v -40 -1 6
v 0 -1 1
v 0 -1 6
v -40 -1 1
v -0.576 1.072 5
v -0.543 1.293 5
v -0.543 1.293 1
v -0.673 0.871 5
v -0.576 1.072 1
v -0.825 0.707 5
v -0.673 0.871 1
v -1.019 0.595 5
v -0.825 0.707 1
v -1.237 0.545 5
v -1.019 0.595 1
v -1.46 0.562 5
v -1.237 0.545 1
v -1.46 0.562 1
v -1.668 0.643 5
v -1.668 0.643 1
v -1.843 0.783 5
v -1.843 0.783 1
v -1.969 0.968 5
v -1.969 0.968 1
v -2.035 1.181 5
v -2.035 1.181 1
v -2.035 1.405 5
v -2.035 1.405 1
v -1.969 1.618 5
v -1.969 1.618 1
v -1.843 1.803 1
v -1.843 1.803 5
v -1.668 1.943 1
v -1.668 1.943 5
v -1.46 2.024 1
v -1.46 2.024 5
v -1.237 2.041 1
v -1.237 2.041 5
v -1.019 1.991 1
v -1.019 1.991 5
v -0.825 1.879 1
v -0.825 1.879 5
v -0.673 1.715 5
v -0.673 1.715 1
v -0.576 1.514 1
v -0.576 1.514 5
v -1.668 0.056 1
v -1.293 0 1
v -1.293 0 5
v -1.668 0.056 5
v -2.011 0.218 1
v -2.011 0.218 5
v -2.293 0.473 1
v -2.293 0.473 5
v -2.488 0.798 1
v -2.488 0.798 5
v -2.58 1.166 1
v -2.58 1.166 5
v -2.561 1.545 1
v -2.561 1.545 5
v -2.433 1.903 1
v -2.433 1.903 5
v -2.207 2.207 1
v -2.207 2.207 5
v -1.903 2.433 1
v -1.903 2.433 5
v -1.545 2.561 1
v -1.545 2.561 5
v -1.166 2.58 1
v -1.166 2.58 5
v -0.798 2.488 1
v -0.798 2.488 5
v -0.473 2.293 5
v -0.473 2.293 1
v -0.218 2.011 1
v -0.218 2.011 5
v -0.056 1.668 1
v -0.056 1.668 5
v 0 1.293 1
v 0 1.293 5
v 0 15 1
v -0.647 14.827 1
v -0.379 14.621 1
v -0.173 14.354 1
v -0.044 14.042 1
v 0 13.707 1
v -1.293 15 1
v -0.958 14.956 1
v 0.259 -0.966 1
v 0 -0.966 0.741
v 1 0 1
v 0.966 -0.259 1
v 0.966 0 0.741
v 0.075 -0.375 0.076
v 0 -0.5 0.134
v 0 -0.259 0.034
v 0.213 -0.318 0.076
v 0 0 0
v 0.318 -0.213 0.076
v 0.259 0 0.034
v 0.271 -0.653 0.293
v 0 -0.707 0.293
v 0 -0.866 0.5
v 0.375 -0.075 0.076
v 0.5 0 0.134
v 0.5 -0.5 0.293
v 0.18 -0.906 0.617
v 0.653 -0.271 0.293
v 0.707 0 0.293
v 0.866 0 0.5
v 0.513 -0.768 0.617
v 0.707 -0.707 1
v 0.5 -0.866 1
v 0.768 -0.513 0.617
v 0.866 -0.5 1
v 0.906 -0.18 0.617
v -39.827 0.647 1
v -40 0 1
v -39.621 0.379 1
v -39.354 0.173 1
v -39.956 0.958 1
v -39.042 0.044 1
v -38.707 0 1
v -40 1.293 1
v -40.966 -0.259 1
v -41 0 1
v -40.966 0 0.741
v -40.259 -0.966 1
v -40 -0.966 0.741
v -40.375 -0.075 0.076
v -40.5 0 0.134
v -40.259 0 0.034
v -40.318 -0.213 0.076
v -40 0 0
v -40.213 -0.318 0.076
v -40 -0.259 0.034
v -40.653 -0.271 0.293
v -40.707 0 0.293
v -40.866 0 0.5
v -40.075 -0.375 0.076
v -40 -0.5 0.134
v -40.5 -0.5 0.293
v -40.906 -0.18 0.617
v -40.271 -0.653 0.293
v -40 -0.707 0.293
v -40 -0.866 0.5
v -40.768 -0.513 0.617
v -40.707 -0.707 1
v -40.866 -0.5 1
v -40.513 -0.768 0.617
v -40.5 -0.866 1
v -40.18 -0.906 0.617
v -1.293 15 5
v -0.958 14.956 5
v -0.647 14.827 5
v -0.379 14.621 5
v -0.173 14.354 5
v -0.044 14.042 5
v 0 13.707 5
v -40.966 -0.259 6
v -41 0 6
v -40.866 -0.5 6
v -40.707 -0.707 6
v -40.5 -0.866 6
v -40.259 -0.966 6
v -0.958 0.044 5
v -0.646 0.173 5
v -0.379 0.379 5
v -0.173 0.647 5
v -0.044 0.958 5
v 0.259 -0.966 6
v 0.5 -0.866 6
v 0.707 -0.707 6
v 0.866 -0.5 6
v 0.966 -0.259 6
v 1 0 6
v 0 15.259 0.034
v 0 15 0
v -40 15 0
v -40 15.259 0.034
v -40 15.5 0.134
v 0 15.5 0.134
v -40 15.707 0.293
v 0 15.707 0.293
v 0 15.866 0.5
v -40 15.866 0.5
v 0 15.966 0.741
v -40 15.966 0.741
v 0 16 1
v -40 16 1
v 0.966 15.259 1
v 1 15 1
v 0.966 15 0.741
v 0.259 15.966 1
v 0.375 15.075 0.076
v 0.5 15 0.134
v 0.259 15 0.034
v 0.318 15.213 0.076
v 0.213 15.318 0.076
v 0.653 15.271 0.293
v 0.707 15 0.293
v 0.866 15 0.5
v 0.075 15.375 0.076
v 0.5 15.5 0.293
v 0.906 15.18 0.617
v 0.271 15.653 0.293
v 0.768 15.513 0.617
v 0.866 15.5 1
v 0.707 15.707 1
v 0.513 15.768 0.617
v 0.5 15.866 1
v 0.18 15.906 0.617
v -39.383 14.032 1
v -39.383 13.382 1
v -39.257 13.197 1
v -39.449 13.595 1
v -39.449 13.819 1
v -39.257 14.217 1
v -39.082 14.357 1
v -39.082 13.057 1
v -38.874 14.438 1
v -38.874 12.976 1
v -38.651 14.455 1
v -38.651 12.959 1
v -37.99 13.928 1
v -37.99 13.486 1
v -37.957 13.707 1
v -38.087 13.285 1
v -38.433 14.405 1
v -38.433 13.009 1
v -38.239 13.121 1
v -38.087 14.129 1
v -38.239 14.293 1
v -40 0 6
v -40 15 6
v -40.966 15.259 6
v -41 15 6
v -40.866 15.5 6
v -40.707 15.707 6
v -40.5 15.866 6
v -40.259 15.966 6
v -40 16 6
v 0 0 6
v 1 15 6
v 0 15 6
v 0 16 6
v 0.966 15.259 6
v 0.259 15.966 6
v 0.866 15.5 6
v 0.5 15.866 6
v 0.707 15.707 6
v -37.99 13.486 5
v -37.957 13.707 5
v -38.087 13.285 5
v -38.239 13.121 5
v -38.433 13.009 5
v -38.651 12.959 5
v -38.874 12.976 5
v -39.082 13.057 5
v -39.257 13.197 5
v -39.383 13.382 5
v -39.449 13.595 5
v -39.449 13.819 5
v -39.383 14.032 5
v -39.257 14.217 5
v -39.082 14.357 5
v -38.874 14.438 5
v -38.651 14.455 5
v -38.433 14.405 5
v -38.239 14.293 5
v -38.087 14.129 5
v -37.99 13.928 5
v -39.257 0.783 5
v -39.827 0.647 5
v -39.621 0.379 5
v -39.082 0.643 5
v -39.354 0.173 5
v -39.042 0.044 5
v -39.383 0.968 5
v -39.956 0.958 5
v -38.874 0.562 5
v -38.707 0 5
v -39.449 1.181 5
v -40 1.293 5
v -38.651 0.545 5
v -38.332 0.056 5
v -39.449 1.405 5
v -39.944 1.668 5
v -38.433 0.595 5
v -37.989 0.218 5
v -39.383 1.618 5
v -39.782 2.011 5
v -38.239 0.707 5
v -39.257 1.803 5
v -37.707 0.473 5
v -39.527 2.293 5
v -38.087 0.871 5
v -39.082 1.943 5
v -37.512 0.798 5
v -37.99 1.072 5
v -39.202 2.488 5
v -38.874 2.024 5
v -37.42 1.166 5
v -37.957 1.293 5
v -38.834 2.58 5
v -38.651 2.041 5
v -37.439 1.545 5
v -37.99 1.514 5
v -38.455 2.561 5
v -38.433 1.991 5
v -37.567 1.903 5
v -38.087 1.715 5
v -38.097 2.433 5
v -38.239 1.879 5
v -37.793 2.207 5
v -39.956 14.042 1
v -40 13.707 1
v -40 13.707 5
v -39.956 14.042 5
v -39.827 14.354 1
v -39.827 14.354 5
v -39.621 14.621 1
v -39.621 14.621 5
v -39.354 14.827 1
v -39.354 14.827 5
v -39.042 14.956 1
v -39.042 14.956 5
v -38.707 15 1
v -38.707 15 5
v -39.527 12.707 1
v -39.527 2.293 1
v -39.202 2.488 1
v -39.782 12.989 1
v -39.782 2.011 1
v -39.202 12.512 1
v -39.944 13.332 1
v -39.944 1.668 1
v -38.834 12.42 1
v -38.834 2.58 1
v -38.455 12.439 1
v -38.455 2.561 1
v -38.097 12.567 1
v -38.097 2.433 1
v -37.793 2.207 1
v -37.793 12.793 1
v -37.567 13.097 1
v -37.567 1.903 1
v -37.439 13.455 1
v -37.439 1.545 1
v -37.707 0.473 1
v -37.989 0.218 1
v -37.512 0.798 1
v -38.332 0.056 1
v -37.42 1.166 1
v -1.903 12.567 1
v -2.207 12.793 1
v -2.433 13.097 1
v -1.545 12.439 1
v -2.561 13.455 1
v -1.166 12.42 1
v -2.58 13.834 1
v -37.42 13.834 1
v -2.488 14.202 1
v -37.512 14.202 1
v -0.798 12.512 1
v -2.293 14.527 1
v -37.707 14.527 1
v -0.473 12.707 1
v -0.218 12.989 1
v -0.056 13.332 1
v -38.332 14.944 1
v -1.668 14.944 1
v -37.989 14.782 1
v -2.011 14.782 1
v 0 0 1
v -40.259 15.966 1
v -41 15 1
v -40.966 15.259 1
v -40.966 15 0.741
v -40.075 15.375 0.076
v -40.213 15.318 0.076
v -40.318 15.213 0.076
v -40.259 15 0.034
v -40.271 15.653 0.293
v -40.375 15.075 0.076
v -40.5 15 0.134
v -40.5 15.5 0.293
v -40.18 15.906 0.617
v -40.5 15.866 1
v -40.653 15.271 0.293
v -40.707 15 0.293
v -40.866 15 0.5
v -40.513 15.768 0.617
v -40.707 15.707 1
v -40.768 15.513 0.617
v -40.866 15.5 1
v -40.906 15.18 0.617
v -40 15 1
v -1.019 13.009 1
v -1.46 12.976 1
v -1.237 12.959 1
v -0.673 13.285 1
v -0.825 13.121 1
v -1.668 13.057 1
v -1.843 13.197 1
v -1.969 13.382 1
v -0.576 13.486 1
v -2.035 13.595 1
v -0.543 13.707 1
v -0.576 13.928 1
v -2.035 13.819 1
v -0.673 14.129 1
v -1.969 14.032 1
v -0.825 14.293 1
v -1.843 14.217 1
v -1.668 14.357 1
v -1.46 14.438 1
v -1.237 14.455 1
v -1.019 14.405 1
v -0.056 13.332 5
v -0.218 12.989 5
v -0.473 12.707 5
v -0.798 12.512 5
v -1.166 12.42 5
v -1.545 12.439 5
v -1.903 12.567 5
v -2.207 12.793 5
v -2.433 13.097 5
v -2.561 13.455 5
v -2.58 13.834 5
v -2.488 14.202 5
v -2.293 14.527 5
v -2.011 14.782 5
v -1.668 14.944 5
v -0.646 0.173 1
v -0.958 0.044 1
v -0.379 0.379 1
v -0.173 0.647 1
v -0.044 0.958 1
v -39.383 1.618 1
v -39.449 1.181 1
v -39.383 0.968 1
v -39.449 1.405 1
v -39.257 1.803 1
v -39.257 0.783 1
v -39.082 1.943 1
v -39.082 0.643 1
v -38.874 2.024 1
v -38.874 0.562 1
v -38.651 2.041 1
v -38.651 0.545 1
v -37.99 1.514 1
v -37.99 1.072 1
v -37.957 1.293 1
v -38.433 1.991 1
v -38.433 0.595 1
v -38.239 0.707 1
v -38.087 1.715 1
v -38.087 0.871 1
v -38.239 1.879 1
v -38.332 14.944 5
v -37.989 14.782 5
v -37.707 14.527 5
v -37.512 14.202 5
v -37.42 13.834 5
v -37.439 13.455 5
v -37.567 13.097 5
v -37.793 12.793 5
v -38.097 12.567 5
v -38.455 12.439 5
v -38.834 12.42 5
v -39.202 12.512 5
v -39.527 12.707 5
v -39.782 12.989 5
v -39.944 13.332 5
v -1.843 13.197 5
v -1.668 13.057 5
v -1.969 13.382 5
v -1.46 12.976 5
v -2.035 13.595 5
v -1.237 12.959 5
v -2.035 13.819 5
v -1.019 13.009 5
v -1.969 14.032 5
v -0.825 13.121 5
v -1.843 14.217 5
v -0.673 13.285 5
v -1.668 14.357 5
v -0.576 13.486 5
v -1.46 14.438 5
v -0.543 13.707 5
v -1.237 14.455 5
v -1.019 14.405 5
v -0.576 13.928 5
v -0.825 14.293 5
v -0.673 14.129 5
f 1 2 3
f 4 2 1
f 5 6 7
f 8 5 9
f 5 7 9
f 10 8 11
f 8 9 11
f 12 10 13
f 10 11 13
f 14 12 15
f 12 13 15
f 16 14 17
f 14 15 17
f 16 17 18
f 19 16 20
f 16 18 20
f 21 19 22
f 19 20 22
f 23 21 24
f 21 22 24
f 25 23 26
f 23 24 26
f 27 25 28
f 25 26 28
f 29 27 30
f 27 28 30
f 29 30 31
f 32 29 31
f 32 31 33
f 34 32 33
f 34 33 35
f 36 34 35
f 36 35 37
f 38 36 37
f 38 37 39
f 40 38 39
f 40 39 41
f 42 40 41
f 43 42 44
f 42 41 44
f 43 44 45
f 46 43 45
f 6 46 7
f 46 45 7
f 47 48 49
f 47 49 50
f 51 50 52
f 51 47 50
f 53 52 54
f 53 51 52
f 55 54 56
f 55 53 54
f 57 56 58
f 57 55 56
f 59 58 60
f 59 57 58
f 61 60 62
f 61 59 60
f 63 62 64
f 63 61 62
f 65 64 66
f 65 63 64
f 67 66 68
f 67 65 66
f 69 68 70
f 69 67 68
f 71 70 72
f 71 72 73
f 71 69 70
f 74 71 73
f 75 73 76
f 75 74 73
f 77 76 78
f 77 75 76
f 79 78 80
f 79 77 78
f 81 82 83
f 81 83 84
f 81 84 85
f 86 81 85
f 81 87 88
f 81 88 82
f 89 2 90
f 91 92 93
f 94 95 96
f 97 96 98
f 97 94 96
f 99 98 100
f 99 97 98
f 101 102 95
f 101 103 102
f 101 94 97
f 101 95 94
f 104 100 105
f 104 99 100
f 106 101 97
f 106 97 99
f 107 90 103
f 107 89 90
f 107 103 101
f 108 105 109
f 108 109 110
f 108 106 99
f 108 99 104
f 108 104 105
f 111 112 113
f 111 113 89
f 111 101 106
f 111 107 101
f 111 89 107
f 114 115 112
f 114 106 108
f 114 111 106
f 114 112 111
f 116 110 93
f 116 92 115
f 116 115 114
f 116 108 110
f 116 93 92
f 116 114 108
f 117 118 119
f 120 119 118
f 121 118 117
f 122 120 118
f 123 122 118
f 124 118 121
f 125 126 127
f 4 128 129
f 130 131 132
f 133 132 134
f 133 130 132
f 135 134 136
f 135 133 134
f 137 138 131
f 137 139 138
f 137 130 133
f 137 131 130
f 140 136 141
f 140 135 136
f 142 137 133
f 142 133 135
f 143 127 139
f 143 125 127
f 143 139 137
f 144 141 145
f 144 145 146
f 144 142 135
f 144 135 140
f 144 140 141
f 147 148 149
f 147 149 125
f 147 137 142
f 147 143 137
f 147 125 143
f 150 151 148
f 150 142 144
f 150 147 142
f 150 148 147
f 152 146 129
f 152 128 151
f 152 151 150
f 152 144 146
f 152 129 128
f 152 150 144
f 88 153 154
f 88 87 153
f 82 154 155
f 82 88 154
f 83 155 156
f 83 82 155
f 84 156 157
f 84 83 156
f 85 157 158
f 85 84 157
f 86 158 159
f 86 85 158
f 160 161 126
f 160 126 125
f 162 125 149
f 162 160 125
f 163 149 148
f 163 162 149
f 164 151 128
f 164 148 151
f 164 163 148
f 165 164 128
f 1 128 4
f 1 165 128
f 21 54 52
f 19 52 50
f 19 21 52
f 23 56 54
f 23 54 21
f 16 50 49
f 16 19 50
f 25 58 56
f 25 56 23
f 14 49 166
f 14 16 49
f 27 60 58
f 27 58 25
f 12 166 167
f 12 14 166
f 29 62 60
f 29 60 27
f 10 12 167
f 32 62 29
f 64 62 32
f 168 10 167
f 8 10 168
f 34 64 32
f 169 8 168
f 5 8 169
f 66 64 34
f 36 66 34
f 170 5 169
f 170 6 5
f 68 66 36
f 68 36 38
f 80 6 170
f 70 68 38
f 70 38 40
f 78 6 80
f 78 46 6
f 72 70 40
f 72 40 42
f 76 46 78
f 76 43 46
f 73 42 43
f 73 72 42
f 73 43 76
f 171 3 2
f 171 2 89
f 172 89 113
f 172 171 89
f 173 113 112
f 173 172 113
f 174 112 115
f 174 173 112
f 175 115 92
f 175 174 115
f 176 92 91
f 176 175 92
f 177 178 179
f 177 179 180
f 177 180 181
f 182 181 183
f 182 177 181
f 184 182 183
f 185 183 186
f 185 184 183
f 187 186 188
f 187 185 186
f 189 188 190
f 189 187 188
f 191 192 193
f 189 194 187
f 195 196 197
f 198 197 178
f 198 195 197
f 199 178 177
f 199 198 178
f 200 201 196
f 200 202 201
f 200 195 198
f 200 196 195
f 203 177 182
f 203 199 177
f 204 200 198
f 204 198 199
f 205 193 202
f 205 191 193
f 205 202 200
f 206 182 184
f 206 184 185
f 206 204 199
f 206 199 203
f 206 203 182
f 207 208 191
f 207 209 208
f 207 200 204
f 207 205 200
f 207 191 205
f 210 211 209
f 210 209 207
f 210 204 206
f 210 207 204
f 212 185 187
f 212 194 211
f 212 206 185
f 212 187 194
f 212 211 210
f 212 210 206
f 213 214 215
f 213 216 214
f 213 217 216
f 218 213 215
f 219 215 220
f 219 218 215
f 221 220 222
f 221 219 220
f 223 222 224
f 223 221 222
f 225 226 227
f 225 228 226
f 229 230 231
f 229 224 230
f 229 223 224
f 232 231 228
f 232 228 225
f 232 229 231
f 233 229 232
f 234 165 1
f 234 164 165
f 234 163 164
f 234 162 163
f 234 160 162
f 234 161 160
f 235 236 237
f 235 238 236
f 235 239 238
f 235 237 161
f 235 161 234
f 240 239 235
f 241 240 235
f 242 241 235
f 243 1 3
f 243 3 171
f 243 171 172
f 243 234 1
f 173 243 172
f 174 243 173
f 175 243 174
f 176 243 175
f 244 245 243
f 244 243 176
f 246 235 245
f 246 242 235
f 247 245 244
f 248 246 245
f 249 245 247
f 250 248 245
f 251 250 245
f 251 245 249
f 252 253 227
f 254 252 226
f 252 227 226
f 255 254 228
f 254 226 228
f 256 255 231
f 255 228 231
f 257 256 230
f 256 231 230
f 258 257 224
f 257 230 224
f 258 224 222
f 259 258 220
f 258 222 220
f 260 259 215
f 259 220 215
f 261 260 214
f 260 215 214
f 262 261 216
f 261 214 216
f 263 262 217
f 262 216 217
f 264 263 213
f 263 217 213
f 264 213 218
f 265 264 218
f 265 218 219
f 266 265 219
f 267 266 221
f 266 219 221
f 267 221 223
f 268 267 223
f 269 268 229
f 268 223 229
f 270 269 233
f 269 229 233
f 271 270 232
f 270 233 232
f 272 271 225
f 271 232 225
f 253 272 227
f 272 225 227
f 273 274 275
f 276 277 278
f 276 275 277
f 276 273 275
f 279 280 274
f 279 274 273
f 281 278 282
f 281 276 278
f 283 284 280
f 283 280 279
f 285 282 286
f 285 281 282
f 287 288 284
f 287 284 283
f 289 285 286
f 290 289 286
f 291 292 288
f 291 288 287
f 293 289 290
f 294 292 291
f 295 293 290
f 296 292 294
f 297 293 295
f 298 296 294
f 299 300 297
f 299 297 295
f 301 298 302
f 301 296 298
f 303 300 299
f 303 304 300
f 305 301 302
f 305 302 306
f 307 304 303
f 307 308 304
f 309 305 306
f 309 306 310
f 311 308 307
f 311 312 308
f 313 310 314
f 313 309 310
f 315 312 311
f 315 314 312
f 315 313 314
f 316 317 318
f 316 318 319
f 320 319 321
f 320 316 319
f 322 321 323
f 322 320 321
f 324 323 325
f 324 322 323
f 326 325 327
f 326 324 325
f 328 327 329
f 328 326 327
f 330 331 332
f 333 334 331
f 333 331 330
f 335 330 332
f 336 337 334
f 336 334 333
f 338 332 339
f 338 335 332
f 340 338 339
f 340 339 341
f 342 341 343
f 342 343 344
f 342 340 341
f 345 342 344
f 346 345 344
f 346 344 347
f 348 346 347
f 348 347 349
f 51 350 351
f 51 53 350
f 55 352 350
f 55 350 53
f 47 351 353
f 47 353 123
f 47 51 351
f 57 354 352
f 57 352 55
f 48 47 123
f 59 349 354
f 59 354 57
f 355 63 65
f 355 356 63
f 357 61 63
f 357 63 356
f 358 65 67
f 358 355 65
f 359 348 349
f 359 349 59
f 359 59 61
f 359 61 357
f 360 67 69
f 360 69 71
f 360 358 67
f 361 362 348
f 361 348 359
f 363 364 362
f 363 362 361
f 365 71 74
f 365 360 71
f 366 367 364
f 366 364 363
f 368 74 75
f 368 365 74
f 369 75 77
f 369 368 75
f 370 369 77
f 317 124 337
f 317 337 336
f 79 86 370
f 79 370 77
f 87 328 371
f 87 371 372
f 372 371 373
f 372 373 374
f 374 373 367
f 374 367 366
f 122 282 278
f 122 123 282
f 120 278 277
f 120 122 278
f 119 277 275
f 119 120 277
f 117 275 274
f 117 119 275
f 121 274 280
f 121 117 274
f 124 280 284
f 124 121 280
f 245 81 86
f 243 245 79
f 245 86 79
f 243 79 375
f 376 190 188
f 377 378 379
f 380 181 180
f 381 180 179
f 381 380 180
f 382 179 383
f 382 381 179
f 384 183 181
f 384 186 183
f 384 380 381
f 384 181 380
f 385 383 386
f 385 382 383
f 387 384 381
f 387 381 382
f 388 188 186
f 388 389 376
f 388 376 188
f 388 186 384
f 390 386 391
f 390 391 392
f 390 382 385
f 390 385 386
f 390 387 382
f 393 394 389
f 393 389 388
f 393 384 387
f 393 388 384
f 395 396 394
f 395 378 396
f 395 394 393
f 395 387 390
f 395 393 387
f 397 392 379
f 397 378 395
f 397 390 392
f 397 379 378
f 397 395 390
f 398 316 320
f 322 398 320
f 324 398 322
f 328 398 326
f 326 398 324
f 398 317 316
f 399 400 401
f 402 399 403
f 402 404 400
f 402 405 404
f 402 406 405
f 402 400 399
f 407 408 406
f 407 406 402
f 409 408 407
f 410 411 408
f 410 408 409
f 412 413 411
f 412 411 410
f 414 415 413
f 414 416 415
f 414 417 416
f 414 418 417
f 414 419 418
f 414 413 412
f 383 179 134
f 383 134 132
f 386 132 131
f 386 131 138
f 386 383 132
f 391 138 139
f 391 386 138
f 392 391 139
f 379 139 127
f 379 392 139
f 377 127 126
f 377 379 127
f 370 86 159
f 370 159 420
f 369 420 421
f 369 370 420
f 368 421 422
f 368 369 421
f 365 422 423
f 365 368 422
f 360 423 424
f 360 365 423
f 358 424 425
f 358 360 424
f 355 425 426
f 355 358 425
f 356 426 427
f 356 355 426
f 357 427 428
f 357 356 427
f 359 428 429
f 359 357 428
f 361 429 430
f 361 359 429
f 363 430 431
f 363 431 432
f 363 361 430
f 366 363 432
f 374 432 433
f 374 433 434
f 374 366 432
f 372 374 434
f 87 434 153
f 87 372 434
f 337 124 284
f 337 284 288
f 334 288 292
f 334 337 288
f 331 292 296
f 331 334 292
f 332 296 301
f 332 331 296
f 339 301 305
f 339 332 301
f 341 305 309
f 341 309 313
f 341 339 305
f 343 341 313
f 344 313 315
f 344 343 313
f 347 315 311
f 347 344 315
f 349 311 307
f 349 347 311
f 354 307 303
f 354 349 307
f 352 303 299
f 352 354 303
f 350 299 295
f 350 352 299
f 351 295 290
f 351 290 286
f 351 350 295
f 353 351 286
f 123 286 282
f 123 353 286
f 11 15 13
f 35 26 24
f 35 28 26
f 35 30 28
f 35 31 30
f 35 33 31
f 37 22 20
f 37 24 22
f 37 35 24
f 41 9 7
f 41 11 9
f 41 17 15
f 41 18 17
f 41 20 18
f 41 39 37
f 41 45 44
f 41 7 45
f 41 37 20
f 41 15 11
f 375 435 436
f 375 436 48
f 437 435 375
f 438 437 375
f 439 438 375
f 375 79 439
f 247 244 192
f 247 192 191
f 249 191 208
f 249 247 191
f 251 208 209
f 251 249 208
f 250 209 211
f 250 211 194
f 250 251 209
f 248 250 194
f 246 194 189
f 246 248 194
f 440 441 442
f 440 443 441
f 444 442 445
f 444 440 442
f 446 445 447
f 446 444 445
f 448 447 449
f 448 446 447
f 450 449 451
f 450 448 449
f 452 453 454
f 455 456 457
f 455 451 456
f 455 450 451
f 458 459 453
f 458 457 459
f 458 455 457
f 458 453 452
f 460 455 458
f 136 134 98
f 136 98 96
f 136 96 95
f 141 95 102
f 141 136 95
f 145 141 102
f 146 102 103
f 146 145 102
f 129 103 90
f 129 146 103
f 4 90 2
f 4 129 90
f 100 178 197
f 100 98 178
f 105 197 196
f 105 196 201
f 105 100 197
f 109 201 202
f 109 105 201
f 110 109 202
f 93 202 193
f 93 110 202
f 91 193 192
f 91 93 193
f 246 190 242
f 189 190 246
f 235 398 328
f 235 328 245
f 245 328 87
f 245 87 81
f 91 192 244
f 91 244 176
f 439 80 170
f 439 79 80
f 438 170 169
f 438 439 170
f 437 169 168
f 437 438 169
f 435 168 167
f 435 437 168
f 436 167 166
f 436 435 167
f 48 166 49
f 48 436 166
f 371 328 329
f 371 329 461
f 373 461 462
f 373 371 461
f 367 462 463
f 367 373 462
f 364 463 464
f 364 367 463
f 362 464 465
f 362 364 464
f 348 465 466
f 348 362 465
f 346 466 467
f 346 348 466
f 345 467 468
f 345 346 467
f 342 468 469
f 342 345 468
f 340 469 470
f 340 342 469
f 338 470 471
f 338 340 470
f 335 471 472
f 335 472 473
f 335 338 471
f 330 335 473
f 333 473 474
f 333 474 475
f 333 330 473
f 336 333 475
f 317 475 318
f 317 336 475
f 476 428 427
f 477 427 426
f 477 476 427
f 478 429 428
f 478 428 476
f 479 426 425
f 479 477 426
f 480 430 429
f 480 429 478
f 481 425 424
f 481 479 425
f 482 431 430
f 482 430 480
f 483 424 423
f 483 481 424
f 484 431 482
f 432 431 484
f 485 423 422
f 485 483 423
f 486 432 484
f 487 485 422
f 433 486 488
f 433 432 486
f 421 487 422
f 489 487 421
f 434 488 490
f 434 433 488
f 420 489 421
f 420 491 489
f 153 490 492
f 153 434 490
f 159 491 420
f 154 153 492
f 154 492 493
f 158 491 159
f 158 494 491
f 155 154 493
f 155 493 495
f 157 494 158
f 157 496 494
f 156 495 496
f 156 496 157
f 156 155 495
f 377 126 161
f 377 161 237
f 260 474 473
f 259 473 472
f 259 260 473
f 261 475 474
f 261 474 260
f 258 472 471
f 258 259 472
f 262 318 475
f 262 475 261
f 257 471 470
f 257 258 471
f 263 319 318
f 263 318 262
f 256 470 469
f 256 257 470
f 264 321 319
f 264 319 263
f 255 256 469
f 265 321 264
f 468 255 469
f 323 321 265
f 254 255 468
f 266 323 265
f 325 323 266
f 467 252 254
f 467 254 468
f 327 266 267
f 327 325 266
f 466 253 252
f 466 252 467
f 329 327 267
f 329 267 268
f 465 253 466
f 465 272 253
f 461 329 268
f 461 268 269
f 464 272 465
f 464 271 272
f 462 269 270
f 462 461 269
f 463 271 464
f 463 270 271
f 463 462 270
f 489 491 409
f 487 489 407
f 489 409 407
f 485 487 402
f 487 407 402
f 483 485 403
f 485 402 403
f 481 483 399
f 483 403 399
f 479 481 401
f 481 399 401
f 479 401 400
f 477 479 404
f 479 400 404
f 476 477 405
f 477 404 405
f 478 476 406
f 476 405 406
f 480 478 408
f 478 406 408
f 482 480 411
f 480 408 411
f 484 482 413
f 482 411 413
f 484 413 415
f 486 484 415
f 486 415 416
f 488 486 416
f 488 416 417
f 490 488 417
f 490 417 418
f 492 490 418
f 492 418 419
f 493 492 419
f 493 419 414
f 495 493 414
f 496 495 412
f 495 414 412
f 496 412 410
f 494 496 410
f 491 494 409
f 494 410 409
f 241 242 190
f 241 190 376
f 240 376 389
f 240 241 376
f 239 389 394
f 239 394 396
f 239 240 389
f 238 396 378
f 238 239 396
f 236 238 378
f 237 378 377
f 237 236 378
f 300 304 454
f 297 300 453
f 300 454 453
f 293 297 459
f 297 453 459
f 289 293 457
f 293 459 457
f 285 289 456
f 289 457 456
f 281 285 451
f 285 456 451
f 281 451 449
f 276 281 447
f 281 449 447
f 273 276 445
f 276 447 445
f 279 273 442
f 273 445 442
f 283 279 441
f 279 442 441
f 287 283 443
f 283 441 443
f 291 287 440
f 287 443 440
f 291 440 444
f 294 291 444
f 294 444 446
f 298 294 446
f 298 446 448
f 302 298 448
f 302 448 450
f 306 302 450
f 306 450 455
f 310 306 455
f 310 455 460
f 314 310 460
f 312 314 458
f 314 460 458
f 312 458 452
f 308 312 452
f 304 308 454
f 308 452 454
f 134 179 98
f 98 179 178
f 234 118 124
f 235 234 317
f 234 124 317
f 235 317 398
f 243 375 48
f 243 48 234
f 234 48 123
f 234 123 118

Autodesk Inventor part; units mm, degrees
ref_plane "YZ Plane" through (0, 0, 0) normal (1, 0, 0) x (0, 1, 0)
ref_plane "XZ Plane" through (0, 0, 0) normal (0, 1, 0) x (-1, 0, 0)
ref_plane "XY Plane" through (0, 0, 0) normal (0, 0, 1) x (1, 0, 0)
sketch "Sketch1" plane through (0, 0, 0) normal (0, 0, 1) x (1, 0, 0)
  line L0 (0, 0) -> (-40, 0)
  line L1 (-40, 0) -> (-40, 15)
  line L2 (-40, 15) -> (0, 15)
  line L3 (0, 15) -> (0, 0)
  line L4 (1, -1) -> (-41, -1)
  line L5 (-41, -1) -> (-41, 16)
  line L6 (-41, 16) -> (1, 16)
  line L7 (1, 16) -> (1, -1)
  circle A0 centre (-1.293, 13.707) radius 0.75
  circle A1 centre (-1.293, 1.293) radius 0.75
  circle A2 centre (-38.707, 1.293) radius 0.75
  circle A3 centre (-38.707, 13.707) radius 0.75
  circle A4 centre (-38.707, 13.707) radius 1.293
  circle A5 centre (-38.707, 1.293) radius 1.293
  circle A6 centre (-1.293, 1.293) radius 1.293
  circle A7 centre (-1.293, 13.707) radius 1.293
  dimension "d0" = 40
  dimension "d1" = 15
  dimension "d2" = 42
  dimension "d3" = 17
  dimension "d4" = 1
  dimension "d6" = 1
  dimension "d7" = 1
  dimension "d8" = 1.5
  dimension "d9" = 1.5
  dimension "d10" = 1.293
  dimension "d11" = 1.293
  dimension "d12" = 1.293
  dimension "d13" = 1.293
  dimension "d14" = 1.5
  dimension "d15" = 1.293
  dimension "d16" = 1.293
  dimension "d17" = 1.5
  dimension "d18" = 1.293
  dimension "d19" = 1.293
extrude "Extrusion1" add sketch "Sketch1" along normal blind 6 contours L4 L5 L6 L7
extrude "Extrusion2" add sketch "Sketch1" along normal blind 1 contours L0 A6 L3 | L0 A5 L1 A4 L2 A7 L3 A6 | A6 | L0 L1 A5 | A5 | A7 L2 L3 | A7 | L1 L2 A4 | A4 | A0 | A1 | A2 | A3
extrude "Extrusion4" add sketch "Sketch1" along normal blind 5 contours A6 | A5 | A7 | A4
thread "Thread1" size "M1.6x0.35" class "6H" standard "ANSI Metric M Profile" full length
thread "Thread2" size "M1.6x0.35" class "6H" standard "ANSI Metric M Profile" full length
thread "Thread3" size "M1.6x0.35" class "6H" standard "ANSI Metric M Profile" full length
thread "Thread4" size "M1.6x0.35" class "6H" standard "ANSI Metric M Profile" full length
fillet "Fillet1" radius 1 8 edges at (1, 16, 3) (-41, 16, 3) (-41, -1, 3) (1, -1, 3) (1, 7.5, 0) (-20, 16, 0) (-20, -1, 0) (-41, 7.5, 0)
properties part number "Bottom part of case"
